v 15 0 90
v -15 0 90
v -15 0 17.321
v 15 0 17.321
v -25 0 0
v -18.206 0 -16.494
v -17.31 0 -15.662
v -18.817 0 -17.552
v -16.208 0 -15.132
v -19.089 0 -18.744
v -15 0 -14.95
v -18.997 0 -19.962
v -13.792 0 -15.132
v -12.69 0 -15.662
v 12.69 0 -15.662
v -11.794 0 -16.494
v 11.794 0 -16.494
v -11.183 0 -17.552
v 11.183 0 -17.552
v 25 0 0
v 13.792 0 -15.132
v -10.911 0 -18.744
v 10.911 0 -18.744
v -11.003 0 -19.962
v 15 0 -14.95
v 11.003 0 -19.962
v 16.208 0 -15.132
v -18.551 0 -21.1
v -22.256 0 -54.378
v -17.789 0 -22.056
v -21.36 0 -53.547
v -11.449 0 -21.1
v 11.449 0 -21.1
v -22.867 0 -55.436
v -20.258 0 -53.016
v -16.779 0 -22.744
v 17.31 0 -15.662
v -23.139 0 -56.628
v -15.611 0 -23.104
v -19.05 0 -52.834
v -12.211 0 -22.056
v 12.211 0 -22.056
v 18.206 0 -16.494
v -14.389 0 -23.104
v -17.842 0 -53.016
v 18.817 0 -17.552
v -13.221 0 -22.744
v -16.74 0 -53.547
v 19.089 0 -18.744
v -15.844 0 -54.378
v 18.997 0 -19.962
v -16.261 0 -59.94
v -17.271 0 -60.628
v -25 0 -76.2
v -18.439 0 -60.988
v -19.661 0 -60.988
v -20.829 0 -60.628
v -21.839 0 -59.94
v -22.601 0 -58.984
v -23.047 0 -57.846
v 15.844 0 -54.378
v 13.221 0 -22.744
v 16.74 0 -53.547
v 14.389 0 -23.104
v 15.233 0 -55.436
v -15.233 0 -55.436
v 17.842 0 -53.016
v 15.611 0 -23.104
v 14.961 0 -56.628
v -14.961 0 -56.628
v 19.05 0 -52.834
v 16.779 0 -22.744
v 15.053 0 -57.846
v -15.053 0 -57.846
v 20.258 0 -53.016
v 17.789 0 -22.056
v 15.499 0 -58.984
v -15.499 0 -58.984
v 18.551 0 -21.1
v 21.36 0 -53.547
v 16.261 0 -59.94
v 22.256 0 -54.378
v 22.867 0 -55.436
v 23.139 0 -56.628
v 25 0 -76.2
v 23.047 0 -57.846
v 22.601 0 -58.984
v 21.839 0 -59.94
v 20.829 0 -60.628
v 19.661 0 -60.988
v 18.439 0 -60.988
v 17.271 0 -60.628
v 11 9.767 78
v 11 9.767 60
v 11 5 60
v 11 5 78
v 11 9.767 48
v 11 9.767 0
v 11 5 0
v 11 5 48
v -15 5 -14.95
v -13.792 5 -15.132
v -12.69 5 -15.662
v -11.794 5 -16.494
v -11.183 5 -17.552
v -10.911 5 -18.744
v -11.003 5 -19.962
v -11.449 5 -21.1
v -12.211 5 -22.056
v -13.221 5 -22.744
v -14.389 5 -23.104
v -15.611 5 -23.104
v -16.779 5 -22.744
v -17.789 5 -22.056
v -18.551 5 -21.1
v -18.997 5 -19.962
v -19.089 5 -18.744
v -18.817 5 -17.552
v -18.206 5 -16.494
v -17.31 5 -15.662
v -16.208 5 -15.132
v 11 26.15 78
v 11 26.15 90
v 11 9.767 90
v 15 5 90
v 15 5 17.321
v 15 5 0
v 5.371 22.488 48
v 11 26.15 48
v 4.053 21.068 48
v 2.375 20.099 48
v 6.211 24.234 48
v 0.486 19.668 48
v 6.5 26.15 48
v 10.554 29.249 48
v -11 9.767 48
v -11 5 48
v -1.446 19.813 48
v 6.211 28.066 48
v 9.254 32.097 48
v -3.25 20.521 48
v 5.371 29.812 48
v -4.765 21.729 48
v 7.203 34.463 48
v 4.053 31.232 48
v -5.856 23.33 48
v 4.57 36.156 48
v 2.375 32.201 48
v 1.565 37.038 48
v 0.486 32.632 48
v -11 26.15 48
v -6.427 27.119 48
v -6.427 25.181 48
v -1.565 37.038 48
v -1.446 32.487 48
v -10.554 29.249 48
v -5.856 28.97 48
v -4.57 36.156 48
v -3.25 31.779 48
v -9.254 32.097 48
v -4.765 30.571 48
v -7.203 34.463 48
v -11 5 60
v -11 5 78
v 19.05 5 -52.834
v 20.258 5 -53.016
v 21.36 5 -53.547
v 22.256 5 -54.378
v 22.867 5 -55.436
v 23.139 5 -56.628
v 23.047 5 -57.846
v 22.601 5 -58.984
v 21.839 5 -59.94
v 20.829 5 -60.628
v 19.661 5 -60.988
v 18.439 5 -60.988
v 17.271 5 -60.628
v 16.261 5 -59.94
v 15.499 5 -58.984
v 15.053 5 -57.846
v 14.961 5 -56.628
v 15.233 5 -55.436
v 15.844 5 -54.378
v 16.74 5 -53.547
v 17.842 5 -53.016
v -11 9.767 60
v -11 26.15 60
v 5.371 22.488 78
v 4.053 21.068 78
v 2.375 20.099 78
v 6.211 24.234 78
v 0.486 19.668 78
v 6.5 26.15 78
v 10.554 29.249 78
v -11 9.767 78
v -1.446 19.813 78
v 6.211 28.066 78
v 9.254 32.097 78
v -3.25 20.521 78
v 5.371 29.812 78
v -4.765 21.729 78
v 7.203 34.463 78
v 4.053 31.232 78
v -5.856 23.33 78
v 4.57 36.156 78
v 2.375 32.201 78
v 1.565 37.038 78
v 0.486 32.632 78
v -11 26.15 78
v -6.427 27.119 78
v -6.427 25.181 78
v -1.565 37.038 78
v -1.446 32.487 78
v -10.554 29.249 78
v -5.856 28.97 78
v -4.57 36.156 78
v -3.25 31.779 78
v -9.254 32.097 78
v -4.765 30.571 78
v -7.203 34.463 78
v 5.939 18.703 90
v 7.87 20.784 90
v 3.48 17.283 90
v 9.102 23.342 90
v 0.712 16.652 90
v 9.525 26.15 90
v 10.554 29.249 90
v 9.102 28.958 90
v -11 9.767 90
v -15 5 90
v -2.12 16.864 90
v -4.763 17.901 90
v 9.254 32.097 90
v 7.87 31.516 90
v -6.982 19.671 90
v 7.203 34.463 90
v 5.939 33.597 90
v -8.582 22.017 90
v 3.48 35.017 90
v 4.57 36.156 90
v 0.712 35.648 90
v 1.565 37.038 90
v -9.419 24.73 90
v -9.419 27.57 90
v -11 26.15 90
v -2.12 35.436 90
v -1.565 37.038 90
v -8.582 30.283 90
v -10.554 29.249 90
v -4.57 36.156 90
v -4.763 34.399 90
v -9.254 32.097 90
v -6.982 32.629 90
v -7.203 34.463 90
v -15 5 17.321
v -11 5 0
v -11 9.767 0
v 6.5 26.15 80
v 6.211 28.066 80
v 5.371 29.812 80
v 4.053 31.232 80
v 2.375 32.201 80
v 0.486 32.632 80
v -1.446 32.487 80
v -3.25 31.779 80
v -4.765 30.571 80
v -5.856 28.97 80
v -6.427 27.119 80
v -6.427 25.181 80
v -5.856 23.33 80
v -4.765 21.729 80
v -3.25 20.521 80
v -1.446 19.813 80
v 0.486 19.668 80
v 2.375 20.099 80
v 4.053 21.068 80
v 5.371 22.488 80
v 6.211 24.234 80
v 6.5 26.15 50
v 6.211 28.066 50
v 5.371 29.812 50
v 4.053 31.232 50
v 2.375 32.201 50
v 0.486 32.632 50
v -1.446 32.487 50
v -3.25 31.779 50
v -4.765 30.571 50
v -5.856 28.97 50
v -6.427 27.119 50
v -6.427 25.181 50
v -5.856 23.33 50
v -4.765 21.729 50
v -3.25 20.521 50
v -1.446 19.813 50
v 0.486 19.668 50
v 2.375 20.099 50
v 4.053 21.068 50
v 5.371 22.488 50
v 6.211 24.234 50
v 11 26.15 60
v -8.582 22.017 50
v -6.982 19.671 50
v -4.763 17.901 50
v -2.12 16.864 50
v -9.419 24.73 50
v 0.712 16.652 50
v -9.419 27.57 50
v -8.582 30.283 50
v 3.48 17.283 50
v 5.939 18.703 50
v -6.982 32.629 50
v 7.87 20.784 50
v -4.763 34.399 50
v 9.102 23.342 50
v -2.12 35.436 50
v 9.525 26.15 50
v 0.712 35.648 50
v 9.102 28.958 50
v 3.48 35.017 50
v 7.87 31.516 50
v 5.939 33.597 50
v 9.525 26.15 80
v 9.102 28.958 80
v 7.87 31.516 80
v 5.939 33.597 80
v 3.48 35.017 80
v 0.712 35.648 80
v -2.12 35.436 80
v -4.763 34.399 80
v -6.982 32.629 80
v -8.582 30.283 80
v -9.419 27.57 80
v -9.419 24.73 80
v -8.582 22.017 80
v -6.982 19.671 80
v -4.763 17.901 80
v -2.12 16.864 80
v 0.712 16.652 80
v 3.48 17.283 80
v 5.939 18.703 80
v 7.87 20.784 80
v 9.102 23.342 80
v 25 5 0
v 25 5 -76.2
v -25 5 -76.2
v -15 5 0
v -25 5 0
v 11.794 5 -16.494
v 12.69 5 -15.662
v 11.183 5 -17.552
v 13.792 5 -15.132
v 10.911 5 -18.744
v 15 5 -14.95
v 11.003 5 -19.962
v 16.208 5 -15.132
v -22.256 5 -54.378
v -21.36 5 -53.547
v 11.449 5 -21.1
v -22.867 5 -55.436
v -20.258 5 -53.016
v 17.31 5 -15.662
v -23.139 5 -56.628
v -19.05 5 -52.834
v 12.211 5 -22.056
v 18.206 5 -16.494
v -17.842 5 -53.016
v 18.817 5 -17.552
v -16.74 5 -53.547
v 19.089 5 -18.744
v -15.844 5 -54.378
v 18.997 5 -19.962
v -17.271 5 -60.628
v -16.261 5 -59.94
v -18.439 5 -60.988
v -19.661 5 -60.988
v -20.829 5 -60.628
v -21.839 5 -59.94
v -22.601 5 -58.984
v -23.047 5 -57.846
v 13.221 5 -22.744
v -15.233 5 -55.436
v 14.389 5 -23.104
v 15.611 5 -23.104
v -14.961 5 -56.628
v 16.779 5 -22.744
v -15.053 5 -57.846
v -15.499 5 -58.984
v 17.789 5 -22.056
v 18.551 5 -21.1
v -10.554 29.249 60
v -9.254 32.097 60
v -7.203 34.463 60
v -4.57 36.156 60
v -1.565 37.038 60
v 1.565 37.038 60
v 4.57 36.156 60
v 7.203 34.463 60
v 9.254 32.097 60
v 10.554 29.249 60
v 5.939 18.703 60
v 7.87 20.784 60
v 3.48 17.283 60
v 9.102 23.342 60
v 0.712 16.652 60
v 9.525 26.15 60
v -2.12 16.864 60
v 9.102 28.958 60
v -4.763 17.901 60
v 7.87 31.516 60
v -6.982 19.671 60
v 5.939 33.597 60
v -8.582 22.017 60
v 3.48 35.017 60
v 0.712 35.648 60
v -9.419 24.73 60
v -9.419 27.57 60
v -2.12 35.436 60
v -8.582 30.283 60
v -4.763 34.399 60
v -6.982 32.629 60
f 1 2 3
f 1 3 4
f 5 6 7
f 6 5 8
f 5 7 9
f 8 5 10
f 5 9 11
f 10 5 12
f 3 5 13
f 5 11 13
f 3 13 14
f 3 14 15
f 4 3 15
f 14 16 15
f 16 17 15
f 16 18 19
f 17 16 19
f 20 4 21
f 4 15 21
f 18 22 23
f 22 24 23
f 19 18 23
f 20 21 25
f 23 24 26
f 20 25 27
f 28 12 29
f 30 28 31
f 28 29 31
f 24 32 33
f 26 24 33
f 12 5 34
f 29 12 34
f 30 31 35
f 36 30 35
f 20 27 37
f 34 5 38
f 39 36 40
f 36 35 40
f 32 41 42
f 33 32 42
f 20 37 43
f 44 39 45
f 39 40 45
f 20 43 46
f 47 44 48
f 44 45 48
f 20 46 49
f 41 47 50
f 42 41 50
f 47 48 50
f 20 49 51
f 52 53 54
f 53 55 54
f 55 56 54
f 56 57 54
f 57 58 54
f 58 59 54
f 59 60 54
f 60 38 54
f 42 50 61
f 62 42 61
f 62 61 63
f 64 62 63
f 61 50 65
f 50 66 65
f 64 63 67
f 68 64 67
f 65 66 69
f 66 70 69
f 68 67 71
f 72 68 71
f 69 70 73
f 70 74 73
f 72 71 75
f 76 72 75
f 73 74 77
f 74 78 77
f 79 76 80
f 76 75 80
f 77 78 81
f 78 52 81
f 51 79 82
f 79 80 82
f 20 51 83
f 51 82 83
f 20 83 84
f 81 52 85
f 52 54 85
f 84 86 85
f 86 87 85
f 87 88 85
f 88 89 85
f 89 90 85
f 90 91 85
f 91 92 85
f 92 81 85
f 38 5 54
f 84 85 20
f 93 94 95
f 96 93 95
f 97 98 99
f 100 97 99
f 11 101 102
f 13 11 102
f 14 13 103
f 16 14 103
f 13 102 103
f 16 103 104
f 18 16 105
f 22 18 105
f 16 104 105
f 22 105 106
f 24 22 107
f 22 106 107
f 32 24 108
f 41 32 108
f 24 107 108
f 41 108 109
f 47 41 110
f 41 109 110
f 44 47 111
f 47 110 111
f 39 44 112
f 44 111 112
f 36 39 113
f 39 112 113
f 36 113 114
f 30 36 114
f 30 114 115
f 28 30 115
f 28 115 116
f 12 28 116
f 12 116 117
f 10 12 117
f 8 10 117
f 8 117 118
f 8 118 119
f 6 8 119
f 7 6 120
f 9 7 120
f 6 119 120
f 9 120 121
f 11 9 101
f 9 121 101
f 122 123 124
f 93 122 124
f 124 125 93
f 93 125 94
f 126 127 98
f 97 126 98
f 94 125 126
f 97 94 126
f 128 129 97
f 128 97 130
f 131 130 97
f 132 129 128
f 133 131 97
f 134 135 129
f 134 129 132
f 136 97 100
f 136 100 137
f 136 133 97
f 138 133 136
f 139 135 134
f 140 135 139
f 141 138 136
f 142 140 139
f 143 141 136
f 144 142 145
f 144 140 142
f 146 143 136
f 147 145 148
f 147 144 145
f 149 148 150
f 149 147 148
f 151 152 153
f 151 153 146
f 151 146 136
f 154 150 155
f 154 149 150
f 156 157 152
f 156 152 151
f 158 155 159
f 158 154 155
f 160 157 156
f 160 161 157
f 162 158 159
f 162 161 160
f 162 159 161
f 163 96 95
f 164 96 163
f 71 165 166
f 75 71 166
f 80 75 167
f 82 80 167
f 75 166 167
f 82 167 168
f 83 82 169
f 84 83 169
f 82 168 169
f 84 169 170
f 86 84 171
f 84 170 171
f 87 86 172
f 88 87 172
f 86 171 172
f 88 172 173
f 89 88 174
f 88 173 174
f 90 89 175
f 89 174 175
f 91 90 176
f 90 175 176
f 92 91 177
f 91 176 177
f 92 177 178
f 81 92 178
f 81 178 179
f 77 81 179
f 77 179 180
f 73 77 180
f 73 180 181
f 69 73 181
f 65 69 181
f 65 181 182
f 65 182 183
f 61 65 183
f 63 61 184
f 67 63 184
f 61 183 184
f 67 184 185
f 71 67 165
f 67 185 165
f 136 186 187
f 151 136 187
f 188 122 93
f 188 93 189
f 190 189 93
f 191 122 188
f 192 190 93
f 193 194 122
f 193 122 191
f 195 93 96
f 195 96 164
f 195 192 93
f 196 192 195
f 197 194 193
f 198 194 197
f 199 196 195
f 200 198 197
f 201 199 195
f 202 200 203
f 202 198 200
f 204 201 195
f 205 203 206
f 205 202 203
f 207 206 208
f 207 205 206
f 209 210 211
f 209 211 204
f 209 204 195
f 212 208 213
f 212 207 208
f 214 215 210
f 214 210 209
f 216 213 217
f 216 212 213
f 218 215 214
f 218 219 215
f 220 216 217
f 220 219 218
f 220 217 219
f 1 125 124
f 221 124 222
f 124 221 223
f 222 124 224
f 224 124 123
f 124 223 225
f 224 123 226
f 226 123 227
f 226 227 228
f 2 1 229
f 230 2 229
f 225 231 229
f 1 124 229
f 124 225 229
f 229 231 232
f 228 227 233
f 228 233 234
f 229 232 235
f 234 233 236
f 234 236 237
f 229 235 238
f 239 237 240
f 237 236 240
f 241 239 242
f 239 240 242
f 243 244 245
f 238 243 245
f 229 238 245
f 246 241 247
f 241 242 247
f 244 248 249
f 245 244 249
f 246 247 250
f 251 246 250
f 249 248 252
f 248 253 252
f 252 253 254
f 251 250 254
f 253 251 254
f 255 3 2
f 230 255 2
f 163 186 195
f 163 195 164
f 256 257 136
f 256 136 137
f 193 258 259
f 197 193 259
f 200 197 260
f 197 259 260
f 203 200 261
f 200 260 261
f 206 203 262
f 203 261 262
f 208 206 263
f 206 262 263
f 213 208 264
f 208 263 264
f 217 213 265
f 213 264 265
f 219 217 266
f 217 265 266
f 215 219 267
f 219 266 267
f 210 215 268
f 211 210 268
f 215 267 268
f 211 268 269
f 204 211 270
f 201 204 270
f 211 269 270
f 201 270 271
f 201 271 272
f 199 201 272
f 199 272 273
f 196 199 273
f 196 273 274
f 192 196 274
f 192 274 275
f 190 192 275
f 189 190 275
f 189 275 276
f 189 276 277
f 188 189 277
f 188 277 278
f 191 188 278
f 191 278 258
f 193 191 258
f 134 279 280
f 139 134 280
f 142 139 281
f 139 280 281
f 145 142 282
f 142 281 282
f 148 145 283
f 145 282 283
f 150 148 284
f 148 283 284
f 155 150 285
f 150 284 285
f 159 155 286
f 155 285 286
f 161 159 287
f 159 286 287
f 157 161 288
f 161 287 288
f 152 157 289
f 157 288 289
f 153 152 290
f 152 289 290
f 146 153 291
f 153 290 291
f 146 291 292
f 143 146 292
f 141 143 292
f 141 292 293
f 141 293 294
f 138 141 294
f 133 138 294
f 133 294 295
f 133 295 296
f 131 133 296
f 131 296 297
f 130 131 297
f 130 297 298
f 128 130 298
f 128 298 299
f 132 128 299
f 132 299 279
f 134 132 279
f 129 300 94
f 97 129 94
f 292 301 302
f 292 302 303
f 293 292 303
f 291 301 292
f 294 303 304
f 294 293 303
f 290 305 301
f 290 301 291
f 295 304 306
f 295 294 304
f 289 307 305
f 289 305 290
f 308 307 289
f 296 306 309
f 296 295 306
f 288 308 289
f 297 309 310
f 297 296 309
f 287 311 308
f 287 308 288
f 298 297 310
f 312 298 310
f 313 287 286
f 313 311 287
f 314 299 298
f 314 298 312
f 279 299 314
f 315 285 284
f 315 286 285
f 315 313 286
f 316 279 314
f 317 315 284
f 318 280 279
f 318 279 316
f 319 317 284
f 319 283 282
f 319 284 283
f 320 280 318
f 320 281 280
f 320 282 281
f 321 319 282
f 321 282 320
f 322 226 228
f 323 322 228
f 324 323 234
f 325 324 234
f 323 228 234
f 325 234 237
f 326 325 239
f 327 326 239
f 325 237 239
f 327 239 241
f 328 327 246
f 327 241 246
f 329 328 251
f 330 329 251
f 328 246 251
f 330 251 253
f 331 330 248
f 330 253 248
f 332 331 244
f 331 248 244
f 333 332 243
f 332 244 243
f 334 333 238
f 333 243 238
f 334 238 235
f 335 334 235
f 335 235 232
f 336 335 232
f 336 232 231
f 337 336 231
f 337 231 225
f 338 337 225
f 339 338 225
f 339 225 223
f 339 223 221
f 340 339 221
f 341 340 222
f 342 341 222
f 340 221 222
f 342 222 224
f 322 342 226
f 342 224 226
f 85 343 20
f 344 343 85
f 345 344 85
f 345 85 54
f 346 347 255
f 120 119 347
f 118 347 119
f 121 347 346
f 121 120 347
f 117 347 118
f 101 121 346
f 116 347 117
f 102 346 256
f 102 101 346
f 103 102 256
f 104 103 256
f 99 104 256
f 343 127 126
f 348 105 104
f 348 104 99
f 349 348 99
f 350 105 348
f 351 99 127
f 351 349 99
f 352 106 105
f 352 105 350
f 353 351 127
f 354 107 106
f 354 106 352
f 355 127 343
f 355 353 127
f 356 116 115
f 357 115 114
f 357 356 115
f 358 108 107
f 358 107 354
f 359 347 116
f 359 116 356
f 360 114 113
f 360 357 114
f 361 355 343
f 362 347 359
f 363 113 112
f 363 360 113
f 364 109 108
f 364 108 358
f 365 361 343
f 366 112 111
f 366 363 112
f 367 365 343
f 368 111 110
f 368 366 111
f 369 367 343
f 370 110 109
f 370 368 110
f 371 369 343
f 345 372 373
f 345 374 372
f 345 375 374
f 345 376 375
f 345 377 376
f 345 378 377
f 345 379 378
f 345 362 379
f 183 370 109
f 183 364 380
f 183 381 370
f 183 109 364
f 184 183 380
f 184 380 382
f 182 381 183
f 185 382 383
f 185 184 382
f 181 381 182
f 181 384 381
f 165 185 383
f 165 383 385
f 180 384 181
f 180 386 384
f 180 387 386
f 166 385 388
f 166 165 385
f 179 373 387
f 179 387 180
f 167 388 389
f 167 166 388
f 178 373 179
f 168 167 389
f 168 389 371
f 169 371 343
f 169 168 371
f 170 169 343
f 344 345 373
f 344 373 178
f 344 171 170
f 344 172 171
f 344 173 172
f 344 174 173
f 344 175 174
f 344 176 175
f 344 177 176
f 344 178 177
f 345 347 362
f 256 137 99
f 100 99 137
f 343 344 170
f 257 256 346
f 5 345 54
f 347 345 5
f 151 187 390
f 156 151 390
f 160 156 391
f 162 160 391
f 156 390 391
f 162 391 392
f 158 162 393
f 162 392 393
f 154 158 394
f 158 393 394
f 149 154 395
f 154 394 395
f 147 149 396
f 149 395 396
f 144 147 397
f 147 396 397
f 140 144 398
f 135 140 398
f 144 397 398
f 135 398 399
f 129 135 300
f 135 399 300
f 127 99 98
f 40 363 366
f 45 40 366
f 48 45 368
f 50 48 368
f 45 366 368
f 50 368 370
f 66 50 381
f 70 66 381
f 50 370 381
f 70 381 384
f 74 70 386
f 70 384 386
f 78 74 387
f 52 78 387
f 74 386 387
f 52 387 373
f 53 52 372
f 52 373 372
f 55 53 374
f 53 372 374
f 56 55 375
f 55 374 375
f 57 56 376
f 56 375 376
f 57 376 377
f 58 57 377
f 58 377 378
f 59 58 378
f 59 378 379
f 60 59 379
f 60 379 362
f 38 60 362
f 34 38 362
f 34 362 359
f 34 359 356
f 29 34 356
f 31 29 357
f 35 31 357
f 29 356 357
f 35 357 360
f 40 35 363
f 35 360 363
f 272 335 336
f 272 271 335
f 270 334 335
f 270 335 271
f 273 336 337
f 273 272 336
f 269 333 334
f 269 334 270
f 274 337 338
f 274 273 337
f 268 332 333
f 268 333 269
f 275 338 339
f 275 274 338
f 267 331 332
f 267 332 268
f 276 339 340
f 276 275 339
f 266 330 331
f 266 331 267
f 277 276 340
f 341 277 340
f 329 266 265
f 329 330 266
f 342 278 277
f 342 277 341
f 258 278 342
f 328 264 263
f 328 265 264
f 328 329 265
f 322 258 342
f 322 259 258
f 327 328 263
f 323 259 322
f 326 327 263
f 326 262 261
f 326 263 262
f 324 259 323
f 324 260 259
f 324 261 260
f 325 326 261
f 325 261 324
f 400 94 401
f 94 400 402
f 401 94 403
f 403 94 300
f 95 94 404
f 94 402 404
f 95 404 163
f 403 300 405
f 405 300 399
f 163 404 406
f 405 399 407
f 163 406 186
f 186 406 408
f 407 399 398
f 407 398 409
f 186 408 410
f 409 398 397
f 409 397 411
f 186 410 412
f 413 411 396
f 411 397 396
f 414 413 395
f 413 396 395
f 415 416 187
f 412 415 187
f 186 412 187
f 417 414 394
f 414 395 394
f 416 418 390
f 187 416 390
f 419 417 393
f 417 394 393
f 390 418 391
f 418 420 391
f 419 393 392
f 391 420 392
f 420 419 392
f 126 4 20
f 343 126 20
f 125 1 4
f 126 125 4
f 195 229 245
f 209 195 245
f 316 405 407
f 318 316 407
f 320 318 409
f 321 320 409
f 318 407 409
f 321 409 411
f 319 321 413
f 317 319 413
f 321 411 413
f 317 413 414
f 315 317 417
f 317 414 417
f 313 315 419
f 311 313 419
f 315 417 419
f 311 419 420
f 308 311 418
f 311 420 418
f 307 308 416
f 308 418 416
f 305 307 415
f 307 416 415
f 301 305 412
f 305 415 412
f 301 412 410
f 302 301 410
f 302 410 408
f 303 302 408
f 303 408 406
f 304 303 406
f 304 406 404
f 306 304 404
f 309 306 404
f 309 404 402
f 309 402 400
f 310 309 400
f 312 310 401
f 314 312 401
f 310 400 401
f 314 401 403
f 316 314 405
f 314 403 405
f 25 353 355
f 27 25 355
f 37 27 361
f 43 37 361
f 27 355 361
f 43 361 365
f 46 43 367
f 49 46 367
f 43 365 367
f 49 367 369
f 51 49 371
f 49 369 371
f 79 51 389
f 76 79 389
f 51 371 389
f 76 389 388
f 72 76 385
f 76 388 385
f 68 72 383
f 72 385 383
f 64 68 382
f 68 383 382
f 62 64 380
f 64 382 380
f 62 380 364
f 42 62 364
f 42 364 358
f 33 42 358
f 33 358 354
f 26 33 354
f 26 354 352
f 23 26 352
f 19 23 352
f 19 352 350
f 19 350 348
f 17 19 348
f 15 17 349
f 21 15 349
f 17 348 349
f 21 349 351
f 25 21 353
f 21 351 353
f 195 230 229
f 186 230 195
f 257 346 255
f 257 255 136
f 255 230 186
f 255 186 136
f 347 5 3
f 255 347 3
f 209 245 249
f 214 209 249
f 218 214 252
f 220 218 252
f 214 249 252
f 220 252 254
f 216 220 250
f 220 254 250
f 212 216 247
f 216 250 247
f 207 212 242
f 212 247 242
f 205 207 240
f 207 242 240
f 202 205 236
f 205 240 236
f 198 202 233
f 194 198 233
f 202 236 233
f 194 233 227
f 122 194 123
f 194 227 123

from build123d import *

# Parameters (mm, degrees)
BOSS_EXTRU_7_DEPTH         = 5
BOSS_EXTRU_8_DEPTH         = 12
ESQUISSE25_R               = 9.525
ENL_V_MAT_EXTRU_1_DEPTH    = 10
R_P_TITION_LIN_AIRE2_COUNT = 2
R_P_TITION_LIN_AIRE2_PITCH = 30
ESQUISSE22_R               = 4.1
BOSS_EXTRU_9_DEPTH         = 5
ESQUISSE26_R               = 6.5
ENL_V_MAT_EXTRU_2_DEPTH    = 163.491730559
BOSS_EXTRU_10_START        = -90
BOSS_EXTRU_10_DEPTH        = 78


with BuildPart() as part:
    # Esquisse20 → Boss.-Extru.7 (new body)
    with BuildSketch(Plane.XZ):
        Polygon((-25, 0), (-15, 17.320508076), (-15, 90), (15, 90), (15, 17.320508076), (25, 0), align=None)
    extrude(amount=-BOSS_EXTRU_7_DEPTH)

    # Esquisse21 → Boss.-Extru.8 (add)
    with BuildSketch(Plane.XY.offset(90)):
        with BuildLine():
            Line((-15, 5), (-11, 9.76701437))
            Line((-11, 9.76701437), (-11, 26.15))
            ThreePointArc((-11, 26.15), (0, 37.15), (11, 26.15))
            Line((11, 26.15), (11, 9.76701437))
            Line((11, 9.76701437), (15, 5))
            Line((15, 5), (-15, 5))
        make_face()
    boss_extru_8 = extrude(amount=-BOSS_EXTRU_8_DEPTH)

    # Esquisse25 → Enlèv. mat.-Extru.1 (cut)
    with BuildSketch(Plane.XY.offset(90)):
        with Locations((0, 26.15)):
            Circle(ESQUISSE25_R)
    enl_v_mat_extru_1 = extrude(amount=-ENL_V_MAT_EXTRU_1_DEPTH, mode=Mode.SUBTRACT)

    # Répétition linéaire2: Boss.-Extru.8, Enlèv. mat.-Extru.1 ×2
    with Locations(*[(0, 0, -i * R_P_TITION_LIN_AIRE2_PITCH) for i in range(1, R_P_TITION_LIN_AIRE2_COUNT)]):
        add(boss_extru_8)
        add(enl_v_mat_extru_1, mode=Mode.SUBTRACT)

    # Esquisse22 → Boss.-Extru.9 (add)
    with BuildSketch(Plane(origin=(0, 5, 0), x_dir=(1, 0, 0), z_dir=(0, 1, 0))):
        Polygon((-25, 0), (25, 0), (25, 38.1), (25, 76.2), (-25, 76.2), (-25, 38.1), align=None)
        with Locations(Location((-15, 19.05, 0), (0, 0, 270))):
            Circle(ESQUISSE22_R, mode=Mode.SUBTRACT)
        with Locations(Location((15, 19.05, 0), (0, 0, 270))):
            Circle(ESQUISSE22_R, mode=Mode.SUBTRACT)
        with Locations(Location((19.05, 56.934132562, 0), (0, 0, 270))):
            Circle(ESQUISSE22_R, mode=Mode.SUBTRACT)
        with Locations(Location((-19.05, 56.934132562, 0), (0, 0, 270))):
            Circle(ESQUISSE22_R, mode=Mode.SUBTRACT)
    extrude(amount=-BOSS_EXTRU_9_DEPTH)

    # Esquisse26 → Enlèv. mat.-Extru.2 (cut, through all)
    with BuildSketch(Plane.XY.offset(80)):
        with Locations((0, 26.15)):
            Circle(ESQUISSE26_R)
    extrude(amount=-ENL_V_MAT_EXTRU_2_DEPTH, mode=Mode.SUBTRACT)

    # Esquisse27 → Boss.-Extru.10 (add)
    with BuildSketch(Plane.XY.offset(90).offset(BOSS_EXTRU_10_START)):
        Polygon((-11, 9.76701437), (-11, 5), (-15, 5), align=None)
        Polygon((15, 5), (11, 9.76701437), (11, 5), align=None)
    extrude(amount=BOSS_EXTRU_10_DEPTH)


solid = part.part
